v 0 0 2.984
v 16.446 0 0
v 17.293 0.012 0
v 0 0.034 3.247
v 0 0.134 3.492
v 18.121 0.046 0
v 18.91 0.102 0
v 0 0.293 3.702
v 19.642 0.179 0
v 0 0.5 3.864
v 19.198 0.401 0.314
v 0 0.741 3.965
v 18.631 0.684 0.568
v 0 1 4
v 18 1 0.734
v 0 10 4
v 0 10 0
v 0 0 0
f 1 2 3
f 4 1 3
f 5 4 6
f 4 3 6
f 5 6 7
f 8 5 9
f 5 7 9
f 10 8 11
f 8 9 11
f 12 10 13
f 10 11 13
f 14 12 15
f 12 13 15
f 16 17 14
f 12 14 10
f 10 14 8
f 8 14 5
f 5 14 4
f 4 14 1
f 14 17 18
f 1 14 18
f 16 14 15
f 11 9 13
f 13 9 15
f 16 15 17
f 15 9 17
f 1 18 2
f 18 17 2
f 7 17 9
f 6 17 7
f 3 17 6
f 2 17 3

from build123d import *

# Parameters (mm, degrees)
PAD047_DEPTH    = 4
POCKET007_DEPTH = 10
FILLET_R        = 1


with BuildPart() as part:
    # Sketch069 → Pad047 (new body)
    with BuildSketch(Plane.XY):
        Polygon((0, 10), (0, 0), (20, 0), align=None)
    extrude(amount=PAD047_DEPTH)

    # Sketch070 (on Face2 of Pad047) → Pocket007 (cut)
    with BuildSketch(Plane.XZ):
        Polygon((0, 4), (22.047997, 0), (22.047997, 4), align=None)
    extrude(amount=-POCKET007_DEPTH, mode=Mode.SUBTRACT)

    # Fillet
    fillet_edges = [part.edges().sort_by_distance(p)[0] for p in [
        (10, 0, 2.185776),
    ]]
    fillet(fillet_edges, radius=FILLET_R)


solid = part.part
